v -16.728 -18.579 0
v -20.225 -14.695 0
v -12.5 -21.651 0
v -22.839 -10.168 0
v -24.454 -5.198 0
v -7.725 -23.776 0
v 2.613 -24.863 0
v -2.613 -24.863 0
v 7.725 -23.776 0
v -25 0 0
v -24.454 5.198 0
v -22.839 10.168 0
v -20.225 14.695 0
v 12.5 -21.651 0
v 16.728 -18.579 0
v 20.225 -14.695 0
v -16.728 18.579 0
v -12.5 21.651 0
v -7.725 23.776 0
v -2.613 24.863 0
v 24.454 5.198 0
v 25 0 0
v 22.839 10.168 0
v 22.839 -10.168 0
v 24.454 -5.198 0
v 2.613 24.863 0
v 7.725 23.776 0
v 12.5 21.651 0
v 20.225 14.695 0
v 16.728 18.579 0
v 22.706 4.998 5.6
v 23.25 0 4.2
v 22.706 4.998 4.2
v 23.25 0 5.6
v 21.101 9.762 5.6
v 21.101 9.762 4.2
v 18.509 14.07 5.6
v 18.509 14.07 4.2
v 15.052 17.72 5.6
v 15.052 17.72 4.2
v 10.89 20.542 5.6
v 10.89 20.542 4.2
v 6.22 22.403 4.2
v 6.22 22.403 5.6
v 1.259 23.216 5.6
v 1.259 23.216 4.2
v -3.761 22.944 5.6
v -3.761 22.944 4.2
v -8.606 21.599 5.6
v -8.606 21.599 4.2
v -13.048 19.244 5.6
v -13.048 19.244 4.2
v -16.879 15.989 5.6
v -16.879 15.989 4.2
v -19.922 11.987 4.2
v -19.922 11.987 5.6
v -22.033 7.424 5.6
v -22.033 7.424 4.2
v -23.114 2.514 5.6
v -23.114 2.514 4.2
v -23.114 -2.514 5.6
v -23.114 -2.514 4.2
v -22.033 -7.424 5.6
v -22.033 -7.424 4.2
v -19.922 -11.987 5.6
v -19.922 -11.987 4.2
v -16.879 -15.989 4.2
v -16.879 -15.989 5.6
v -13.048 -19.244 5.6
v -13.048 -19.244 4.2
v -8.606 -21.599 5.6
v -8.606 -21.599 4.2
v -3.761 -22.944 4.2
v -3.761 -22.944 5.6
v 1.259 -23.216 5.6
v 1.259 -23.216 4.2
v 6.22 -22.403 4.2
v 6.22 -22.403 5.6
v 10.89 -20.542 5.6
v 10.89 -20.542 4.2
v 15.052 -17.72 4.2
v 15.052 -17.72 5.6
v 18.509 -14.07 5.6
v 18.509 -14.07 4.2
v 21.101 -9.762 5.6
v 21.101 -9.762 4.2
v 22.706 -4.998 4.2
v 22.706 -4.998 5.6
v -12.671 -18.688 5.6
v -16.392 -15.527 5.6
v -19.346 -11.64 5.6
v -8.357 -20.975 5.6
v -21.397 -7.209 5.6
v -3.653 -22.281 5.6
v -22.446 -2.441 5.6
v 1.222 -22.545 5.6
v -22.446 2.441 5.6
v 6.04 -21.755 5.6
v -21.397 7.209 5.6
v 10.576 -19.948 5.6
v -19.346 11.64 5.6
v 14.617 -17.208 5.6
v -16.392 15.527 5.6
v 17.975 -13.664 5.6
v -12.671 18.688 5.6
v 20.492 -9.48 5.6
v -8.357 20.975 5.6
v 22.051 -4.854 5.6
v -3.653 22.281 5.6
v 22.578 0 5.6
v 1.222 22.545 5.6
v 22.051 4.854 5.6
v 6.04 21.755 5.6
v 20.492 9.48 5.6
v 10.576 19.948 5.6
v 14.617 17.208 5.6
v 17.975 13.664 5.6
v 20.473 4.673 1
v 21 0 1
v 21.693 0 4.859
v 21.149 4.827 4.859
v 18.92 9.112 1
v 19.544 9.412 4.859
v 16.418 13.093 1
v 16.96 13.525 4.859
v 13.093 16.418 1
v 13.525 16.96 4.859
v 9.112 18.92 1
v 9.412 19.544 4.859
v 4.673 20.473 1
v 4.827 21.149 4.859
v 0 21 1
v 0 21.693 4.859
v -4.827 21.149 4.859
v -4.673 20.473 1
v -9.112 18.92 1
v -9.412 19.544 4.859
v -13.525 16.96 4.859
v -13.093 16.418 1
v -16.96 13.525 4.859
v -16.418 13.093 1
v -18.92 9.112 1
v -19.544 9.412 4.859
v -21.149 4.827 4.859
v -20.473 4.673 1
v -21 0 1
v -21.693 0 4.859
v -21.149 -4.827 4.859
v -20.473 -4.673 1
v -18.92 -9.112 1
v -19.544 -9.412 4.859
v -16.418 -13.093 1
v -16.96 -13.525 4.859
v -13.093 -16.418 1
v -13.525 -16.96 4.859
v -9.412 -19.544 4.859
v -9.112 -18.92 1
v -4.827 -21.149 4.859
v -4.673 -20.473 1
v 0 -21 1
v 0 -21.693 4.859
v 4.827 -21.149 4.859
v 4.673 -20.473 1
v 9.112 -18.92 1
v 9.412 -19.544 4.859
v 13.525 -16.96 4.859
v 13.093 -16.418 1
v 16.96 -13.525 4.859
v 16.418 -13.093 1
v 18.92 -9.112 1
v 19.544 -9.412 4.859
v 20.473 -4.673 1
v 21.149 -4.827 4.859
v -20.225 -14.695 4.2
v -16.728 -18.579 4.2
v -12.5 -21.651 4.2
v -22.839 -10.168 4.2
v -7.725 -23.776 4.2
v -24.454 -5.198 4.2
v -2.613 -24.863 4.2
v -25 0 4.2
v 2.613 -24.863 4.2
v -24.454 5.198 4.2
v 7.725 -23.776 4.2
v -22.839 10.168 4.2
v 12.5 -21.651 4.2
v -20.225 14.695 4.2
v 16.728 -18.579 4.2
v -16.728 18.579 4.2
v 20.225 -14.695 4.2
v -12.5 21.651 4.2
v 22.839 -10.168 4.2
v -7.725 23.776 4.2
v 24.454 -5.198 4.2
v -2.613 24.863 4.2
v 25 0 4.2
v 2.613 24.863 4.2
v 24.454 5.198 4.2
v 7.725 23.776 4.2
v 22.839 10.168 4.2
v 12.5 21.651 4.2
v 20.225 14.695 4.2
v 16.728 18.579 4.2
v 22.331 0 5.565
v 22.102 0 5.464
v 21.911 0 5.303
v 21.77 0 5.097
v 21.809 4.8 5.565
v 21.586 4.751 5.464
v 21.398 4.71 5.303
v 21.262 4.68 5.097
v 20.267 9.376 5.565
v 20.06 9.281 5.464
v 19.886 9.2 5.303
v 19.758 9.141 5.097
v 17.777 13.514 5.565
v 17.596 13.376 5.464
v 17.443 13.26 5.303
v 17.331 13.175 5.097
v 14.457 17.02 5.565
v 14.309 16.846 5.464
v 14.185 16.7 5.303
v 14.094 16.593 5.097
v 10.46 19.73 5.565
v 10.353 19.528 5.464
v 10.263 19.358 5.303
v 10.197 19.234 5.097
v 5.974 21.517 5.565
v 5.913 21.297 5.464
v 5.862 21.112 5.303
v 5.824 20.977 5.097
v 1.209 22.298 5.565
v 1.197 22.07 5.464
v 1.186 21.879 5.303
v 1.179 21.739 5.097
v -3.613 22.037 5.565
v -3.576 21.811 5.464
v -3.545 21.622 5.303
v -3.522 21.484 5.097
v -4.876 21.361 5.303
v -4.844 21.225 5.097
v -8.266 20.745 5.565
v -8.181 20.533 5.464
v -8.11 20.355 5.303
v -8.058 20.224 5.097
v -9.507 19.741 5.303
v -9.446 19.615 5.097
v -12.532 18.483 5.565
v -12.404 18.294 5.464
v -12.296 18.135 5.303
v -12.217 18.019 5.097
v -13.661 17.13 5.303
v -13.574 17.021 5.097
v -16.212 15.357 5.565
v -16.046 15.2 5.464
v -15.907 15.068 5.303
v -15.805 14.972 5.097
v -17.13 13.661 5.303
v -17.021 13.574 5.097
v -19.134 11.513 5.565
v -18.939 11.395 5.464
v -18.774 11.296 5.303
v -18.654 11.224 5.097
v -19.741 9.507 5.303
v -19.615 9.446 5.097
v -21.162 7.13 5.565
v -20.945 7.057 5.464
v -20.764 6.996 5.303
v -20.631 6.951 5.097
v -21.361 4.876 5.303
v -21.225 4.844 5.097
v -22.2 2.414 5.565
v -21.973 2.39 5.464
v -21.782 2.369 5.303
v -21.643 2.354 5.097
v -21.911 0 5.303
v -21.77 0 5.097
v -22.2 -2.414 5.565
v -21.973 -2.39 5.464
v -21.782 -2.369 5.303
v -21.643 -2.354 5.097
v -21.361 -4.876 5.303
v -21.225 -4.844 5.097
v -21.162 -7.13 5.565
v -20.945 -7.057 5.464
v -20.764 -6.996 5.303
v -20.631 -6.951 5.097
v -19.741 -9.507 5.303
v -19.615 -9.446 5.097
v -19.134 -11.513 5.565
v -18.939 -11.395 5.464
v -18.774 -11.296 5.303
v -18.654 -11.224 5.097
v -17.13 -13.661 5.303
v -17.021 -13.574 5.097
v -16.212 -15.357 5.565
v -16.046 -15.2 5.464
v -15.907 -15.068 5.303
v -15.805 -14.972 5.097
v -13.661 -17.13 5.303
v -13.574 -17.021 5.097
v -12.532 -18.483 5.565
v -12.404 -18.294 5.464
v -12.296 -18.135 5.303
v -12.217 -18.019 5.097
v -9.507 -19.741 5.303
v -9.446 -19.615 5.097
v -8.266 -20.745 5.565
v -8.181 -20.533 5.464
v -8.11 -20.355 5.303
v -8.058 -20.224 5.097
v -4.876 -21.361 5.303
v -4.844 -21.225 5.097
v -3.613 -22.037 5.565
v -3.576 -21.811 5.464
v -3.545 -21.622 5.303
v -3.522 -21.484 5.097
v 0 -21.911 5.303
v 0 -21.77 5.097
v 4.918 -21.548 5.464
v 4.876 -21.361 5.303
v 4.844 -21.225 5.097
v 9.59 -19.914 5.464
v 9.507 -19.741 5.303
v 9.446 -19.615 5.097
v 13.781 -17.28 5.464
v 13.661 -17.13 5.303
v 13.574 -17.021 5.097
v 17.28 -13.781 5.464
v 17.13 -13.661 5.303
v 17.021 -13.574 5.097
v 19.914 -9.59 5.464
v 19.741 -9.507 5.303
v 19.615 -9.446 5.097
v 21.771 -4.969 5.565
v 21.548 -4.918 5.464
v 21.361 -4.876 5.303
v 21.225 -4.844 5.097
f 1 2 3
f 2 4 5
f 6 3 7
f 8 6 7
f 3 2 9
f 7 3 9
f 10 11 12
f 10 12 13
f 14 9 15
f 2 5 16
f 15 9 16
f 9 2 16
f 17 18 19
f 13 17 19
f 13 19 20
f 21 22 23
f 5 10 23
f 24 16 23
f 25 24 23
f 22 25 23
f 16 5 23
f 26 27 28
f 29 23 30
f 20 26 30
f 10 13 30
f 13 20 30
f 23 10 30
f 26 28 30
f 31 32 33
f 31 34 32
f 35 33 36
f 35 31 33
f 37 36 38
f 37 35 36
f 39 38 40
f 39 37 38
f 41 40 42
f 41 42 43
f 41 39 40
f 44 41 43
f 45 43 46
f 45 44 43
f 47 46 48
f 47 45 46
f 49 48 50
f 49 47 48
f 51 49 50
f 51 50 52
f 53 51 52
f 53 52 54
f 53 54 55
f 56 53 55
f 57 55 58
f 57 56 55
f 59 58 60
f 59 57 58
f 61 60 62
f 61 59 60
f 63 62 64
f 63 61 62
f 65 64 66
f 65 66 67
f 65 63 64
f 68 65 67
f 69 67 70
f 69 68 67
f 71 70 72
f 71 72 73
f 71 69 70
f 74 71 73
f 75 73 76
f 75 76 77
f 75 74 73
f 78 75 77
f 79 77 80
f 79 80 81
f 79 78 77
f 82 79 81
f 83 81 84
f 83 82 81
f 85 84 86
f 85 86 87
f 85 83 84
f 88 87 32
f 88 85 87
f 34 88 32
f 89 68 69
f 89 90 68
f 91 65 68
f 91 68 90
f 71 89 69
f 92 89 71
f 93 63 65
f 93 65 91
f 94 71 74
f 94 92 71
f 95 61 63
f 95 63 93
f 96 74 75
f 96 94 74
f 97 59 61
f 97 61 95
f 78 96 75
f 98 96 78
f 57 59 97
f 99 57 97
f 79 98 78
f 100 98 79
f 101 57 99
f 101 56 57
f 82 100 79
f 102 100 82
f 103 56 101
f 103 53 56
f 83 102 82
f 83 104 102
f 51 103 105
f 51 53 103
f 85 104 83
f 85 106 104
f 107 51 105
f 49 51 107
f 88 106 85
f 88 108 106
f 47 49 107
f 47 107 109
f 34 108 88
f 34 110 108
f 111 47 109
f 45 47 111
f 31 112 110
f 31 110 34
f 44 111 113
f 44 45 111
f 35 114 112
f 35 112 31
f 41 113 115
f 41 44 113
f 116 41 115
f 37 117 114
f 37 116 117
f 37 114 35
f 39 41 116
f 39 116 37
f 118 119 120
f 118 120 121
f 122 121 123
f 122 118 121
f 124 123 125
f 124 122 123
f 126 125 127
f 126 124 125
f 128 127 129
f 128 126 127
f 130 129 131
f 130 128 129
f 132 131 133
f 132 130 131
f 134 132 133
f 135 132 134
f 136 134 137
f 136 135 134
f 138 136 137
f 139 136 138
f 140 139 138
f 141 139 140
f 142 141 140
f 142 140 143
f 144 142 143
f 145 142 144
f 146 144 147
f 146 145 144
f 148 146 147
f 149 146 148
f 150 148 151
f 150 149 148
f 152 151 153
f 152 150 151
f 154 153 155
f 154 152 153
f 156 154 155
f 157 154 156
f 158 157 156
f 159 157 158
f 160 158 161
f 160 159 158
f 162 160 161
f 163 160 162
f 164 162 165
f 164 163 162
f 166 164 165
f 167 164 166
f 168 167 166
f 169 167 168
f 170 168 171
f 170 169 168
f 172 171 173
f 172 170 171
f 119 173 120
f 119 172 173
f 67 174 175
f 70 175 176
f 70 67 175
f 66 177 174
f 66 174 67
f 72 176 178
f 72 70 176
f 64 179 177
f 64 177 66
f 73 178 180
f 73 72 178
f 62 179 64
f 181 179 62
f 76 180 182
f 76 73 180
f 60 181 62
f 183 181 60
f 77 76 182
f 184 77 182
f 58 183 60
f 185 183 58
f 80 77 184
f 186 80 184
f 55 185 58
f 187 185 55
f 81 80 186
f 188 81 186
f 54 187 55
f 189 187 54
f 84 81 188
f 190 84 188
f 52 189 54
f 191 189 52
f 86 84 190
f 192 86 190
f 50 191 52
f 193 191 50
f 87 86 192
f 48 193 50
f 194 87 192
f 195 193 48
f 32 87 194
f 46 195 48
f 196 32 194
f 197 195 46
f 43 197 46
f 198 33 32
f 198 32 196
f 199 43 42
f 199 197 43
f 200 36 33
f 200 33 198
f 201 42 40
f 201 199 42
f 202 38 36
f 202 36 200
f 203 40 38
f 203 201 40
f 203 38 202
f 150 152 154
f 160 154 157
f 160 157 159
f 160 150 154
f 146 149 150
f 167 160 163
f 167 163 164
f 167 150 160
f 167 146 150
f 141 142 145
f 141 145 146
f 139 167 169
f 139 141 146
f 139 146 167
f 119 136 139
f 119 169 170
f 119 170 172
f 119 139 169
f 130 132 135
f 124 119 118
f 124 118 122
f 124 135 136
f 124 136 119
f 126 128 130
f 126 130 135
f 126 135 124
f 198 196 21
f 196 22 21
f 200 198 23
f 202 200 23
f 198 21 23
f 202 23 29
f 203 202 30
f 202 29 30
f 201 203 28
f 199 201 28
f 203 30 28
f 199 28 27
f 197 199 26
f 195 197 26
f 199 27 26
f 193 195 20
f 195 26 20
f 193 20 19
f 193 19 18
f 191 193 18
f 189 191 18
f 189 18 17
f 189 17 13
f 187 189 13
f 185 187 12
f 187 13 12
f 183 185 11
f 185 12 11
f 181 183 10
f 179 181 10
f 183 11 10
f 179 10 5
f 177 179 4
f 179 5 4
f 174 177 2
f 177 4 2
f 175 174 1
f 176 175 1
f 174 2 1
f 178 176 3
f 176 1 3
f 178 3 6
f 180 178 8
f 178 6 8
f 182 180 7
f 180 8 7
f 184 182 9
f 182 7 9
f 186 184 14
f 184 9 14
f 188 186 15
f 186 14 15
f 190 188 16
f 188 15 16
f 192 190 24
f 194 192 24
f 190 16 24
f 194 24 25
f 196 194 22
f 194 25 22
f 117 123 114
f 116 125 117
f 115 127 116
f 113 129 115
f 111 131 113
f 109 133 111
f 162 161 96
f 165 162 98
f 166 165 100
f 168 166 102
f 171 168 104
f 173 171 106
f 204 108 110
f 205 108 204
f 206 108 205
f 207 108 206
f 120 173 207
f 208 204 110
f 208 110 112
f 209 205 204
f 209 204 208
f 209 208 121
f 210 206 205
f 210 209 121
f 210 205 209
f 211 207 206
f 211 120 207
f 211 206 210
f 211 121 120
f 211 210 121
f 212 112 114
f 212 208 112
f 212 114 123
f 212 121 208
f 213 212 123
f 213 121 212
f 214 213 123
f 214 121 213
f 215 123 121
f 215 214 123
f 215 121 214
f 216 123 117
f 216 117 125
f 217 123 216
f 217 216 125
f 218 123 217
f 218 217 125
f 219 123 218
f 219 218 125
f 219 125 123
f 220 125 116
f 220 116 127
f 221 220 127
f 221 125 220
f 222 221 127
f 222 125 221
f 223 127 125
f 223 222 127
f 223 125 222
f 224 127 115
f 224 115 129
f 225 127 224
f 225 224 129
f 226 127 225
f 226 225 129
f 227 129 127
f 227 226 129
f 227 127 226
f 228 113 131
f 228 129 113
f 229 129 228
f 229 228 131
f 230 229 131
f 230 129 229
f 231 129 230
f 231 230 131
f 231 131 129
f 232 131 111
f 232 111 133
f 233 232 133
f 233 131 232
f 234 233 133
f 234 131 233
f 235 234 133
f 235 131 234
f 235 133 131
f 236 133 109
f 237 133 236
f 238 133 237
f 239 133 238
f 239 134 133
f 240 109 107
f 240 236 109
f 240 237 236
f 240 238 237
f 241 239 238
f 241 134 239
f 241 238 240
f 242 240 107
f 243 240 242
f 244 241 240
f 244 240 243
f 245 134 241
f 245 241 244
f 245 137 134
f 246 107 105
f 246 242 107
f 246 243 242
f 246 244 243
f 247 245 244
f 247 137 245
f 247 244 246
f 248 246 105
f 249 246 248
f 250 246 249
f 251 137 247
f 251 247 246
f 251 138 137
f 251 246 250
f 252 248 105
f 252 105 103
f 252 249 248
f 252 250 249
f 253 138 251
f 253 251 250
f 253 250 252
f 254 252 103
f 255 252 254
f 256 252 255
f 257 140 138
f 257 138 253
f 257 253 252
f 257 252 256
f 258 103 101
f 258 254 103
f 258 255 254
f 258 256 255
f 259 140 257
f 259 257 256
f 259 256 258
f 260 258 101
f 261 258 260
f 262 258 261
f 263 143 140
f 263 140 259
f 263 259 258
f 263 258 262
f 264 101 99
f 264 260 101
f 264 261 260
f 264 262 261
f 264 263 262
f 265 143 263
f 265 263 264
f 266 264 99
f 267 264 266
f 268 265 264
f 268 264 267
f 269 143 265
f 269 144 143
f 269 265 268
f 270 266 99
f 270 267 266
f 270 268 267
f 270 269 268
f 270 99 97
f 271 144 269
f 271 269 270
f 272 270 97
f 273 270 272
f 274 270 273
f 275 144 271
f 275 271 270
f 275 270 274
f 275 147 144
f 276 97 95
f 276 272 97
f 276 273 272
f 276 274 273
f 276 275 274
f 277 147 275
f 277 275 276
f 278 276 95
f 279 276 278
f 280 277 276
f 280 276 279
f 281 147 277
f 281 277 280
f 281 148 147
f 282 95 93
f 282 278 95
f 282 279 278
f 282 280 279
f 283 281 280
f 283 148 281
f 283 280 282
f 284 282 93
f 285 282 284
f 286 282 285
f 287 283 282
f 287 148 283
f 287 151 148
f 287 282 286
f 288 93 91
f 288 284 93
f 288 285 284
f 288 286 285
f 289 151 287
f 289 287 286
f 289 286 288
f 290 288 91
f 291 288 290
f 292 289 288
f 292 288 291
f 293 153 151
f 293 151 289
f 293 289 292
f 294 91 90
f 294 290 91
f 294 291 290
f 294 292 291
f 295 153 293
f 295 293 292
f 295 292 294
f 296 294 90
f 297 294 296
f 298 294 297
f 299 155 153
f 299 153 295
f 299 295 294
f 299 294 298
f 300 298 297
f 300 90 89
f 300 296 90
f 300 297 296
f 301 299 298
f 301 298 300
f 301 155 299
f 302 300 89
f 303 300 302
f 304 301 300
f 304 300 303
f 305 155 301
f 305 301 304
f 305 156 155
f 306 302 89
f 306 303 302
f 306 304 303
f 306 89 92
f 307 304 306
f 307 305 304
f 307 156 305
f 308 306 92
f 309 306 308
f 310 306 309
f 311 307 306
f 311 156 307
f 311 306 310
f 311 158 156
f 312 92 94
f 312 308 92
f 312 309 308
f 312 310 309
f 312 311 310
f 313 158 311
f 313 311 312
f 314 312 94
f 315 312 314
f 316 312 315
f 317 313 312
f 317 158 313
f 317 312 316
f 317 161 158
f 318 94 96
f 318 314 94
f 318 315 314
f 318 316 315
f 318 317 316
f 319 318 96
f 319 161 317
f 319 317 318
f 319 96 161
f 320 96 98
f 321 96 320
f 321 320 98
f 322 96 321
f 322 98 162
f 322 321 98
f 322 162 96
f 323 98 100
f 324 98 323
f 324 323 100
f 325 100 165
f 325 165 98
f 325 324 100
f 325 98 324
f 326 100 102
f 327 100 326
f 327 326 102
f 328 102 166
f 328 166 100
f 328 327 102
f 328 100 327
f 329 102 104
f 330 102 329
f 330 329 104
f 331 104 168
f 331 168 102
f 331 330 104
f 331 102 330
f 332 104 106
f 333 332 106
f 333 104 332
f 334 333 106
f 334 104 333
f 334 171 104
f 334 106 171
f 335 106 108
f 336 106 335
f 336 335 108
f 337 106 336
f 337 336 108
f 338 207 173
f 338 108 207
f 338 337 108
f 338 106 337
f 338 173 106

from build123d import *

# Parameters (mm, degrees)
F0_R     = 25
F1_DEPTH = 1
F5_R     = 25
F5_R_2   = 23.25
F6_DEPTH = 3.2
F7_R     = 0.9


with BuildPart() as f1:
    # F0 (on Top) → F1 (new body)
    with BuildSketch(Plane.XY):
        Circle(F0_R)
    extrude(amount=F1_DEPTH)

    # F3 (on Front) → F4 (revolve)
    with BuildSketch(Plane.XZ):
        Polygon((21, 1), (23.25, 1), (23.25, 5.6), (21.8255799264, 5.6), align=None)
    revolve(axis=Axis((0, 0, 1), (0, 0, 1)))

    # F5 (on face) → F6 (join)
    with BuildSketch(Plane.XY.offset(1)):
        Circle(F5_R)
        Circle(F5_R_2, mode=Mode.SUBTRACT)
    extrude(amount=F6_DEPTH)

    # F7
    f7_edges = [f1.edges().sort_by_distance(p)[0] for p in [
        (-21.82558, 0, 5.6),
    ]]
    fillet(f7_edges, radius=F7_R)


solid = f1.part
